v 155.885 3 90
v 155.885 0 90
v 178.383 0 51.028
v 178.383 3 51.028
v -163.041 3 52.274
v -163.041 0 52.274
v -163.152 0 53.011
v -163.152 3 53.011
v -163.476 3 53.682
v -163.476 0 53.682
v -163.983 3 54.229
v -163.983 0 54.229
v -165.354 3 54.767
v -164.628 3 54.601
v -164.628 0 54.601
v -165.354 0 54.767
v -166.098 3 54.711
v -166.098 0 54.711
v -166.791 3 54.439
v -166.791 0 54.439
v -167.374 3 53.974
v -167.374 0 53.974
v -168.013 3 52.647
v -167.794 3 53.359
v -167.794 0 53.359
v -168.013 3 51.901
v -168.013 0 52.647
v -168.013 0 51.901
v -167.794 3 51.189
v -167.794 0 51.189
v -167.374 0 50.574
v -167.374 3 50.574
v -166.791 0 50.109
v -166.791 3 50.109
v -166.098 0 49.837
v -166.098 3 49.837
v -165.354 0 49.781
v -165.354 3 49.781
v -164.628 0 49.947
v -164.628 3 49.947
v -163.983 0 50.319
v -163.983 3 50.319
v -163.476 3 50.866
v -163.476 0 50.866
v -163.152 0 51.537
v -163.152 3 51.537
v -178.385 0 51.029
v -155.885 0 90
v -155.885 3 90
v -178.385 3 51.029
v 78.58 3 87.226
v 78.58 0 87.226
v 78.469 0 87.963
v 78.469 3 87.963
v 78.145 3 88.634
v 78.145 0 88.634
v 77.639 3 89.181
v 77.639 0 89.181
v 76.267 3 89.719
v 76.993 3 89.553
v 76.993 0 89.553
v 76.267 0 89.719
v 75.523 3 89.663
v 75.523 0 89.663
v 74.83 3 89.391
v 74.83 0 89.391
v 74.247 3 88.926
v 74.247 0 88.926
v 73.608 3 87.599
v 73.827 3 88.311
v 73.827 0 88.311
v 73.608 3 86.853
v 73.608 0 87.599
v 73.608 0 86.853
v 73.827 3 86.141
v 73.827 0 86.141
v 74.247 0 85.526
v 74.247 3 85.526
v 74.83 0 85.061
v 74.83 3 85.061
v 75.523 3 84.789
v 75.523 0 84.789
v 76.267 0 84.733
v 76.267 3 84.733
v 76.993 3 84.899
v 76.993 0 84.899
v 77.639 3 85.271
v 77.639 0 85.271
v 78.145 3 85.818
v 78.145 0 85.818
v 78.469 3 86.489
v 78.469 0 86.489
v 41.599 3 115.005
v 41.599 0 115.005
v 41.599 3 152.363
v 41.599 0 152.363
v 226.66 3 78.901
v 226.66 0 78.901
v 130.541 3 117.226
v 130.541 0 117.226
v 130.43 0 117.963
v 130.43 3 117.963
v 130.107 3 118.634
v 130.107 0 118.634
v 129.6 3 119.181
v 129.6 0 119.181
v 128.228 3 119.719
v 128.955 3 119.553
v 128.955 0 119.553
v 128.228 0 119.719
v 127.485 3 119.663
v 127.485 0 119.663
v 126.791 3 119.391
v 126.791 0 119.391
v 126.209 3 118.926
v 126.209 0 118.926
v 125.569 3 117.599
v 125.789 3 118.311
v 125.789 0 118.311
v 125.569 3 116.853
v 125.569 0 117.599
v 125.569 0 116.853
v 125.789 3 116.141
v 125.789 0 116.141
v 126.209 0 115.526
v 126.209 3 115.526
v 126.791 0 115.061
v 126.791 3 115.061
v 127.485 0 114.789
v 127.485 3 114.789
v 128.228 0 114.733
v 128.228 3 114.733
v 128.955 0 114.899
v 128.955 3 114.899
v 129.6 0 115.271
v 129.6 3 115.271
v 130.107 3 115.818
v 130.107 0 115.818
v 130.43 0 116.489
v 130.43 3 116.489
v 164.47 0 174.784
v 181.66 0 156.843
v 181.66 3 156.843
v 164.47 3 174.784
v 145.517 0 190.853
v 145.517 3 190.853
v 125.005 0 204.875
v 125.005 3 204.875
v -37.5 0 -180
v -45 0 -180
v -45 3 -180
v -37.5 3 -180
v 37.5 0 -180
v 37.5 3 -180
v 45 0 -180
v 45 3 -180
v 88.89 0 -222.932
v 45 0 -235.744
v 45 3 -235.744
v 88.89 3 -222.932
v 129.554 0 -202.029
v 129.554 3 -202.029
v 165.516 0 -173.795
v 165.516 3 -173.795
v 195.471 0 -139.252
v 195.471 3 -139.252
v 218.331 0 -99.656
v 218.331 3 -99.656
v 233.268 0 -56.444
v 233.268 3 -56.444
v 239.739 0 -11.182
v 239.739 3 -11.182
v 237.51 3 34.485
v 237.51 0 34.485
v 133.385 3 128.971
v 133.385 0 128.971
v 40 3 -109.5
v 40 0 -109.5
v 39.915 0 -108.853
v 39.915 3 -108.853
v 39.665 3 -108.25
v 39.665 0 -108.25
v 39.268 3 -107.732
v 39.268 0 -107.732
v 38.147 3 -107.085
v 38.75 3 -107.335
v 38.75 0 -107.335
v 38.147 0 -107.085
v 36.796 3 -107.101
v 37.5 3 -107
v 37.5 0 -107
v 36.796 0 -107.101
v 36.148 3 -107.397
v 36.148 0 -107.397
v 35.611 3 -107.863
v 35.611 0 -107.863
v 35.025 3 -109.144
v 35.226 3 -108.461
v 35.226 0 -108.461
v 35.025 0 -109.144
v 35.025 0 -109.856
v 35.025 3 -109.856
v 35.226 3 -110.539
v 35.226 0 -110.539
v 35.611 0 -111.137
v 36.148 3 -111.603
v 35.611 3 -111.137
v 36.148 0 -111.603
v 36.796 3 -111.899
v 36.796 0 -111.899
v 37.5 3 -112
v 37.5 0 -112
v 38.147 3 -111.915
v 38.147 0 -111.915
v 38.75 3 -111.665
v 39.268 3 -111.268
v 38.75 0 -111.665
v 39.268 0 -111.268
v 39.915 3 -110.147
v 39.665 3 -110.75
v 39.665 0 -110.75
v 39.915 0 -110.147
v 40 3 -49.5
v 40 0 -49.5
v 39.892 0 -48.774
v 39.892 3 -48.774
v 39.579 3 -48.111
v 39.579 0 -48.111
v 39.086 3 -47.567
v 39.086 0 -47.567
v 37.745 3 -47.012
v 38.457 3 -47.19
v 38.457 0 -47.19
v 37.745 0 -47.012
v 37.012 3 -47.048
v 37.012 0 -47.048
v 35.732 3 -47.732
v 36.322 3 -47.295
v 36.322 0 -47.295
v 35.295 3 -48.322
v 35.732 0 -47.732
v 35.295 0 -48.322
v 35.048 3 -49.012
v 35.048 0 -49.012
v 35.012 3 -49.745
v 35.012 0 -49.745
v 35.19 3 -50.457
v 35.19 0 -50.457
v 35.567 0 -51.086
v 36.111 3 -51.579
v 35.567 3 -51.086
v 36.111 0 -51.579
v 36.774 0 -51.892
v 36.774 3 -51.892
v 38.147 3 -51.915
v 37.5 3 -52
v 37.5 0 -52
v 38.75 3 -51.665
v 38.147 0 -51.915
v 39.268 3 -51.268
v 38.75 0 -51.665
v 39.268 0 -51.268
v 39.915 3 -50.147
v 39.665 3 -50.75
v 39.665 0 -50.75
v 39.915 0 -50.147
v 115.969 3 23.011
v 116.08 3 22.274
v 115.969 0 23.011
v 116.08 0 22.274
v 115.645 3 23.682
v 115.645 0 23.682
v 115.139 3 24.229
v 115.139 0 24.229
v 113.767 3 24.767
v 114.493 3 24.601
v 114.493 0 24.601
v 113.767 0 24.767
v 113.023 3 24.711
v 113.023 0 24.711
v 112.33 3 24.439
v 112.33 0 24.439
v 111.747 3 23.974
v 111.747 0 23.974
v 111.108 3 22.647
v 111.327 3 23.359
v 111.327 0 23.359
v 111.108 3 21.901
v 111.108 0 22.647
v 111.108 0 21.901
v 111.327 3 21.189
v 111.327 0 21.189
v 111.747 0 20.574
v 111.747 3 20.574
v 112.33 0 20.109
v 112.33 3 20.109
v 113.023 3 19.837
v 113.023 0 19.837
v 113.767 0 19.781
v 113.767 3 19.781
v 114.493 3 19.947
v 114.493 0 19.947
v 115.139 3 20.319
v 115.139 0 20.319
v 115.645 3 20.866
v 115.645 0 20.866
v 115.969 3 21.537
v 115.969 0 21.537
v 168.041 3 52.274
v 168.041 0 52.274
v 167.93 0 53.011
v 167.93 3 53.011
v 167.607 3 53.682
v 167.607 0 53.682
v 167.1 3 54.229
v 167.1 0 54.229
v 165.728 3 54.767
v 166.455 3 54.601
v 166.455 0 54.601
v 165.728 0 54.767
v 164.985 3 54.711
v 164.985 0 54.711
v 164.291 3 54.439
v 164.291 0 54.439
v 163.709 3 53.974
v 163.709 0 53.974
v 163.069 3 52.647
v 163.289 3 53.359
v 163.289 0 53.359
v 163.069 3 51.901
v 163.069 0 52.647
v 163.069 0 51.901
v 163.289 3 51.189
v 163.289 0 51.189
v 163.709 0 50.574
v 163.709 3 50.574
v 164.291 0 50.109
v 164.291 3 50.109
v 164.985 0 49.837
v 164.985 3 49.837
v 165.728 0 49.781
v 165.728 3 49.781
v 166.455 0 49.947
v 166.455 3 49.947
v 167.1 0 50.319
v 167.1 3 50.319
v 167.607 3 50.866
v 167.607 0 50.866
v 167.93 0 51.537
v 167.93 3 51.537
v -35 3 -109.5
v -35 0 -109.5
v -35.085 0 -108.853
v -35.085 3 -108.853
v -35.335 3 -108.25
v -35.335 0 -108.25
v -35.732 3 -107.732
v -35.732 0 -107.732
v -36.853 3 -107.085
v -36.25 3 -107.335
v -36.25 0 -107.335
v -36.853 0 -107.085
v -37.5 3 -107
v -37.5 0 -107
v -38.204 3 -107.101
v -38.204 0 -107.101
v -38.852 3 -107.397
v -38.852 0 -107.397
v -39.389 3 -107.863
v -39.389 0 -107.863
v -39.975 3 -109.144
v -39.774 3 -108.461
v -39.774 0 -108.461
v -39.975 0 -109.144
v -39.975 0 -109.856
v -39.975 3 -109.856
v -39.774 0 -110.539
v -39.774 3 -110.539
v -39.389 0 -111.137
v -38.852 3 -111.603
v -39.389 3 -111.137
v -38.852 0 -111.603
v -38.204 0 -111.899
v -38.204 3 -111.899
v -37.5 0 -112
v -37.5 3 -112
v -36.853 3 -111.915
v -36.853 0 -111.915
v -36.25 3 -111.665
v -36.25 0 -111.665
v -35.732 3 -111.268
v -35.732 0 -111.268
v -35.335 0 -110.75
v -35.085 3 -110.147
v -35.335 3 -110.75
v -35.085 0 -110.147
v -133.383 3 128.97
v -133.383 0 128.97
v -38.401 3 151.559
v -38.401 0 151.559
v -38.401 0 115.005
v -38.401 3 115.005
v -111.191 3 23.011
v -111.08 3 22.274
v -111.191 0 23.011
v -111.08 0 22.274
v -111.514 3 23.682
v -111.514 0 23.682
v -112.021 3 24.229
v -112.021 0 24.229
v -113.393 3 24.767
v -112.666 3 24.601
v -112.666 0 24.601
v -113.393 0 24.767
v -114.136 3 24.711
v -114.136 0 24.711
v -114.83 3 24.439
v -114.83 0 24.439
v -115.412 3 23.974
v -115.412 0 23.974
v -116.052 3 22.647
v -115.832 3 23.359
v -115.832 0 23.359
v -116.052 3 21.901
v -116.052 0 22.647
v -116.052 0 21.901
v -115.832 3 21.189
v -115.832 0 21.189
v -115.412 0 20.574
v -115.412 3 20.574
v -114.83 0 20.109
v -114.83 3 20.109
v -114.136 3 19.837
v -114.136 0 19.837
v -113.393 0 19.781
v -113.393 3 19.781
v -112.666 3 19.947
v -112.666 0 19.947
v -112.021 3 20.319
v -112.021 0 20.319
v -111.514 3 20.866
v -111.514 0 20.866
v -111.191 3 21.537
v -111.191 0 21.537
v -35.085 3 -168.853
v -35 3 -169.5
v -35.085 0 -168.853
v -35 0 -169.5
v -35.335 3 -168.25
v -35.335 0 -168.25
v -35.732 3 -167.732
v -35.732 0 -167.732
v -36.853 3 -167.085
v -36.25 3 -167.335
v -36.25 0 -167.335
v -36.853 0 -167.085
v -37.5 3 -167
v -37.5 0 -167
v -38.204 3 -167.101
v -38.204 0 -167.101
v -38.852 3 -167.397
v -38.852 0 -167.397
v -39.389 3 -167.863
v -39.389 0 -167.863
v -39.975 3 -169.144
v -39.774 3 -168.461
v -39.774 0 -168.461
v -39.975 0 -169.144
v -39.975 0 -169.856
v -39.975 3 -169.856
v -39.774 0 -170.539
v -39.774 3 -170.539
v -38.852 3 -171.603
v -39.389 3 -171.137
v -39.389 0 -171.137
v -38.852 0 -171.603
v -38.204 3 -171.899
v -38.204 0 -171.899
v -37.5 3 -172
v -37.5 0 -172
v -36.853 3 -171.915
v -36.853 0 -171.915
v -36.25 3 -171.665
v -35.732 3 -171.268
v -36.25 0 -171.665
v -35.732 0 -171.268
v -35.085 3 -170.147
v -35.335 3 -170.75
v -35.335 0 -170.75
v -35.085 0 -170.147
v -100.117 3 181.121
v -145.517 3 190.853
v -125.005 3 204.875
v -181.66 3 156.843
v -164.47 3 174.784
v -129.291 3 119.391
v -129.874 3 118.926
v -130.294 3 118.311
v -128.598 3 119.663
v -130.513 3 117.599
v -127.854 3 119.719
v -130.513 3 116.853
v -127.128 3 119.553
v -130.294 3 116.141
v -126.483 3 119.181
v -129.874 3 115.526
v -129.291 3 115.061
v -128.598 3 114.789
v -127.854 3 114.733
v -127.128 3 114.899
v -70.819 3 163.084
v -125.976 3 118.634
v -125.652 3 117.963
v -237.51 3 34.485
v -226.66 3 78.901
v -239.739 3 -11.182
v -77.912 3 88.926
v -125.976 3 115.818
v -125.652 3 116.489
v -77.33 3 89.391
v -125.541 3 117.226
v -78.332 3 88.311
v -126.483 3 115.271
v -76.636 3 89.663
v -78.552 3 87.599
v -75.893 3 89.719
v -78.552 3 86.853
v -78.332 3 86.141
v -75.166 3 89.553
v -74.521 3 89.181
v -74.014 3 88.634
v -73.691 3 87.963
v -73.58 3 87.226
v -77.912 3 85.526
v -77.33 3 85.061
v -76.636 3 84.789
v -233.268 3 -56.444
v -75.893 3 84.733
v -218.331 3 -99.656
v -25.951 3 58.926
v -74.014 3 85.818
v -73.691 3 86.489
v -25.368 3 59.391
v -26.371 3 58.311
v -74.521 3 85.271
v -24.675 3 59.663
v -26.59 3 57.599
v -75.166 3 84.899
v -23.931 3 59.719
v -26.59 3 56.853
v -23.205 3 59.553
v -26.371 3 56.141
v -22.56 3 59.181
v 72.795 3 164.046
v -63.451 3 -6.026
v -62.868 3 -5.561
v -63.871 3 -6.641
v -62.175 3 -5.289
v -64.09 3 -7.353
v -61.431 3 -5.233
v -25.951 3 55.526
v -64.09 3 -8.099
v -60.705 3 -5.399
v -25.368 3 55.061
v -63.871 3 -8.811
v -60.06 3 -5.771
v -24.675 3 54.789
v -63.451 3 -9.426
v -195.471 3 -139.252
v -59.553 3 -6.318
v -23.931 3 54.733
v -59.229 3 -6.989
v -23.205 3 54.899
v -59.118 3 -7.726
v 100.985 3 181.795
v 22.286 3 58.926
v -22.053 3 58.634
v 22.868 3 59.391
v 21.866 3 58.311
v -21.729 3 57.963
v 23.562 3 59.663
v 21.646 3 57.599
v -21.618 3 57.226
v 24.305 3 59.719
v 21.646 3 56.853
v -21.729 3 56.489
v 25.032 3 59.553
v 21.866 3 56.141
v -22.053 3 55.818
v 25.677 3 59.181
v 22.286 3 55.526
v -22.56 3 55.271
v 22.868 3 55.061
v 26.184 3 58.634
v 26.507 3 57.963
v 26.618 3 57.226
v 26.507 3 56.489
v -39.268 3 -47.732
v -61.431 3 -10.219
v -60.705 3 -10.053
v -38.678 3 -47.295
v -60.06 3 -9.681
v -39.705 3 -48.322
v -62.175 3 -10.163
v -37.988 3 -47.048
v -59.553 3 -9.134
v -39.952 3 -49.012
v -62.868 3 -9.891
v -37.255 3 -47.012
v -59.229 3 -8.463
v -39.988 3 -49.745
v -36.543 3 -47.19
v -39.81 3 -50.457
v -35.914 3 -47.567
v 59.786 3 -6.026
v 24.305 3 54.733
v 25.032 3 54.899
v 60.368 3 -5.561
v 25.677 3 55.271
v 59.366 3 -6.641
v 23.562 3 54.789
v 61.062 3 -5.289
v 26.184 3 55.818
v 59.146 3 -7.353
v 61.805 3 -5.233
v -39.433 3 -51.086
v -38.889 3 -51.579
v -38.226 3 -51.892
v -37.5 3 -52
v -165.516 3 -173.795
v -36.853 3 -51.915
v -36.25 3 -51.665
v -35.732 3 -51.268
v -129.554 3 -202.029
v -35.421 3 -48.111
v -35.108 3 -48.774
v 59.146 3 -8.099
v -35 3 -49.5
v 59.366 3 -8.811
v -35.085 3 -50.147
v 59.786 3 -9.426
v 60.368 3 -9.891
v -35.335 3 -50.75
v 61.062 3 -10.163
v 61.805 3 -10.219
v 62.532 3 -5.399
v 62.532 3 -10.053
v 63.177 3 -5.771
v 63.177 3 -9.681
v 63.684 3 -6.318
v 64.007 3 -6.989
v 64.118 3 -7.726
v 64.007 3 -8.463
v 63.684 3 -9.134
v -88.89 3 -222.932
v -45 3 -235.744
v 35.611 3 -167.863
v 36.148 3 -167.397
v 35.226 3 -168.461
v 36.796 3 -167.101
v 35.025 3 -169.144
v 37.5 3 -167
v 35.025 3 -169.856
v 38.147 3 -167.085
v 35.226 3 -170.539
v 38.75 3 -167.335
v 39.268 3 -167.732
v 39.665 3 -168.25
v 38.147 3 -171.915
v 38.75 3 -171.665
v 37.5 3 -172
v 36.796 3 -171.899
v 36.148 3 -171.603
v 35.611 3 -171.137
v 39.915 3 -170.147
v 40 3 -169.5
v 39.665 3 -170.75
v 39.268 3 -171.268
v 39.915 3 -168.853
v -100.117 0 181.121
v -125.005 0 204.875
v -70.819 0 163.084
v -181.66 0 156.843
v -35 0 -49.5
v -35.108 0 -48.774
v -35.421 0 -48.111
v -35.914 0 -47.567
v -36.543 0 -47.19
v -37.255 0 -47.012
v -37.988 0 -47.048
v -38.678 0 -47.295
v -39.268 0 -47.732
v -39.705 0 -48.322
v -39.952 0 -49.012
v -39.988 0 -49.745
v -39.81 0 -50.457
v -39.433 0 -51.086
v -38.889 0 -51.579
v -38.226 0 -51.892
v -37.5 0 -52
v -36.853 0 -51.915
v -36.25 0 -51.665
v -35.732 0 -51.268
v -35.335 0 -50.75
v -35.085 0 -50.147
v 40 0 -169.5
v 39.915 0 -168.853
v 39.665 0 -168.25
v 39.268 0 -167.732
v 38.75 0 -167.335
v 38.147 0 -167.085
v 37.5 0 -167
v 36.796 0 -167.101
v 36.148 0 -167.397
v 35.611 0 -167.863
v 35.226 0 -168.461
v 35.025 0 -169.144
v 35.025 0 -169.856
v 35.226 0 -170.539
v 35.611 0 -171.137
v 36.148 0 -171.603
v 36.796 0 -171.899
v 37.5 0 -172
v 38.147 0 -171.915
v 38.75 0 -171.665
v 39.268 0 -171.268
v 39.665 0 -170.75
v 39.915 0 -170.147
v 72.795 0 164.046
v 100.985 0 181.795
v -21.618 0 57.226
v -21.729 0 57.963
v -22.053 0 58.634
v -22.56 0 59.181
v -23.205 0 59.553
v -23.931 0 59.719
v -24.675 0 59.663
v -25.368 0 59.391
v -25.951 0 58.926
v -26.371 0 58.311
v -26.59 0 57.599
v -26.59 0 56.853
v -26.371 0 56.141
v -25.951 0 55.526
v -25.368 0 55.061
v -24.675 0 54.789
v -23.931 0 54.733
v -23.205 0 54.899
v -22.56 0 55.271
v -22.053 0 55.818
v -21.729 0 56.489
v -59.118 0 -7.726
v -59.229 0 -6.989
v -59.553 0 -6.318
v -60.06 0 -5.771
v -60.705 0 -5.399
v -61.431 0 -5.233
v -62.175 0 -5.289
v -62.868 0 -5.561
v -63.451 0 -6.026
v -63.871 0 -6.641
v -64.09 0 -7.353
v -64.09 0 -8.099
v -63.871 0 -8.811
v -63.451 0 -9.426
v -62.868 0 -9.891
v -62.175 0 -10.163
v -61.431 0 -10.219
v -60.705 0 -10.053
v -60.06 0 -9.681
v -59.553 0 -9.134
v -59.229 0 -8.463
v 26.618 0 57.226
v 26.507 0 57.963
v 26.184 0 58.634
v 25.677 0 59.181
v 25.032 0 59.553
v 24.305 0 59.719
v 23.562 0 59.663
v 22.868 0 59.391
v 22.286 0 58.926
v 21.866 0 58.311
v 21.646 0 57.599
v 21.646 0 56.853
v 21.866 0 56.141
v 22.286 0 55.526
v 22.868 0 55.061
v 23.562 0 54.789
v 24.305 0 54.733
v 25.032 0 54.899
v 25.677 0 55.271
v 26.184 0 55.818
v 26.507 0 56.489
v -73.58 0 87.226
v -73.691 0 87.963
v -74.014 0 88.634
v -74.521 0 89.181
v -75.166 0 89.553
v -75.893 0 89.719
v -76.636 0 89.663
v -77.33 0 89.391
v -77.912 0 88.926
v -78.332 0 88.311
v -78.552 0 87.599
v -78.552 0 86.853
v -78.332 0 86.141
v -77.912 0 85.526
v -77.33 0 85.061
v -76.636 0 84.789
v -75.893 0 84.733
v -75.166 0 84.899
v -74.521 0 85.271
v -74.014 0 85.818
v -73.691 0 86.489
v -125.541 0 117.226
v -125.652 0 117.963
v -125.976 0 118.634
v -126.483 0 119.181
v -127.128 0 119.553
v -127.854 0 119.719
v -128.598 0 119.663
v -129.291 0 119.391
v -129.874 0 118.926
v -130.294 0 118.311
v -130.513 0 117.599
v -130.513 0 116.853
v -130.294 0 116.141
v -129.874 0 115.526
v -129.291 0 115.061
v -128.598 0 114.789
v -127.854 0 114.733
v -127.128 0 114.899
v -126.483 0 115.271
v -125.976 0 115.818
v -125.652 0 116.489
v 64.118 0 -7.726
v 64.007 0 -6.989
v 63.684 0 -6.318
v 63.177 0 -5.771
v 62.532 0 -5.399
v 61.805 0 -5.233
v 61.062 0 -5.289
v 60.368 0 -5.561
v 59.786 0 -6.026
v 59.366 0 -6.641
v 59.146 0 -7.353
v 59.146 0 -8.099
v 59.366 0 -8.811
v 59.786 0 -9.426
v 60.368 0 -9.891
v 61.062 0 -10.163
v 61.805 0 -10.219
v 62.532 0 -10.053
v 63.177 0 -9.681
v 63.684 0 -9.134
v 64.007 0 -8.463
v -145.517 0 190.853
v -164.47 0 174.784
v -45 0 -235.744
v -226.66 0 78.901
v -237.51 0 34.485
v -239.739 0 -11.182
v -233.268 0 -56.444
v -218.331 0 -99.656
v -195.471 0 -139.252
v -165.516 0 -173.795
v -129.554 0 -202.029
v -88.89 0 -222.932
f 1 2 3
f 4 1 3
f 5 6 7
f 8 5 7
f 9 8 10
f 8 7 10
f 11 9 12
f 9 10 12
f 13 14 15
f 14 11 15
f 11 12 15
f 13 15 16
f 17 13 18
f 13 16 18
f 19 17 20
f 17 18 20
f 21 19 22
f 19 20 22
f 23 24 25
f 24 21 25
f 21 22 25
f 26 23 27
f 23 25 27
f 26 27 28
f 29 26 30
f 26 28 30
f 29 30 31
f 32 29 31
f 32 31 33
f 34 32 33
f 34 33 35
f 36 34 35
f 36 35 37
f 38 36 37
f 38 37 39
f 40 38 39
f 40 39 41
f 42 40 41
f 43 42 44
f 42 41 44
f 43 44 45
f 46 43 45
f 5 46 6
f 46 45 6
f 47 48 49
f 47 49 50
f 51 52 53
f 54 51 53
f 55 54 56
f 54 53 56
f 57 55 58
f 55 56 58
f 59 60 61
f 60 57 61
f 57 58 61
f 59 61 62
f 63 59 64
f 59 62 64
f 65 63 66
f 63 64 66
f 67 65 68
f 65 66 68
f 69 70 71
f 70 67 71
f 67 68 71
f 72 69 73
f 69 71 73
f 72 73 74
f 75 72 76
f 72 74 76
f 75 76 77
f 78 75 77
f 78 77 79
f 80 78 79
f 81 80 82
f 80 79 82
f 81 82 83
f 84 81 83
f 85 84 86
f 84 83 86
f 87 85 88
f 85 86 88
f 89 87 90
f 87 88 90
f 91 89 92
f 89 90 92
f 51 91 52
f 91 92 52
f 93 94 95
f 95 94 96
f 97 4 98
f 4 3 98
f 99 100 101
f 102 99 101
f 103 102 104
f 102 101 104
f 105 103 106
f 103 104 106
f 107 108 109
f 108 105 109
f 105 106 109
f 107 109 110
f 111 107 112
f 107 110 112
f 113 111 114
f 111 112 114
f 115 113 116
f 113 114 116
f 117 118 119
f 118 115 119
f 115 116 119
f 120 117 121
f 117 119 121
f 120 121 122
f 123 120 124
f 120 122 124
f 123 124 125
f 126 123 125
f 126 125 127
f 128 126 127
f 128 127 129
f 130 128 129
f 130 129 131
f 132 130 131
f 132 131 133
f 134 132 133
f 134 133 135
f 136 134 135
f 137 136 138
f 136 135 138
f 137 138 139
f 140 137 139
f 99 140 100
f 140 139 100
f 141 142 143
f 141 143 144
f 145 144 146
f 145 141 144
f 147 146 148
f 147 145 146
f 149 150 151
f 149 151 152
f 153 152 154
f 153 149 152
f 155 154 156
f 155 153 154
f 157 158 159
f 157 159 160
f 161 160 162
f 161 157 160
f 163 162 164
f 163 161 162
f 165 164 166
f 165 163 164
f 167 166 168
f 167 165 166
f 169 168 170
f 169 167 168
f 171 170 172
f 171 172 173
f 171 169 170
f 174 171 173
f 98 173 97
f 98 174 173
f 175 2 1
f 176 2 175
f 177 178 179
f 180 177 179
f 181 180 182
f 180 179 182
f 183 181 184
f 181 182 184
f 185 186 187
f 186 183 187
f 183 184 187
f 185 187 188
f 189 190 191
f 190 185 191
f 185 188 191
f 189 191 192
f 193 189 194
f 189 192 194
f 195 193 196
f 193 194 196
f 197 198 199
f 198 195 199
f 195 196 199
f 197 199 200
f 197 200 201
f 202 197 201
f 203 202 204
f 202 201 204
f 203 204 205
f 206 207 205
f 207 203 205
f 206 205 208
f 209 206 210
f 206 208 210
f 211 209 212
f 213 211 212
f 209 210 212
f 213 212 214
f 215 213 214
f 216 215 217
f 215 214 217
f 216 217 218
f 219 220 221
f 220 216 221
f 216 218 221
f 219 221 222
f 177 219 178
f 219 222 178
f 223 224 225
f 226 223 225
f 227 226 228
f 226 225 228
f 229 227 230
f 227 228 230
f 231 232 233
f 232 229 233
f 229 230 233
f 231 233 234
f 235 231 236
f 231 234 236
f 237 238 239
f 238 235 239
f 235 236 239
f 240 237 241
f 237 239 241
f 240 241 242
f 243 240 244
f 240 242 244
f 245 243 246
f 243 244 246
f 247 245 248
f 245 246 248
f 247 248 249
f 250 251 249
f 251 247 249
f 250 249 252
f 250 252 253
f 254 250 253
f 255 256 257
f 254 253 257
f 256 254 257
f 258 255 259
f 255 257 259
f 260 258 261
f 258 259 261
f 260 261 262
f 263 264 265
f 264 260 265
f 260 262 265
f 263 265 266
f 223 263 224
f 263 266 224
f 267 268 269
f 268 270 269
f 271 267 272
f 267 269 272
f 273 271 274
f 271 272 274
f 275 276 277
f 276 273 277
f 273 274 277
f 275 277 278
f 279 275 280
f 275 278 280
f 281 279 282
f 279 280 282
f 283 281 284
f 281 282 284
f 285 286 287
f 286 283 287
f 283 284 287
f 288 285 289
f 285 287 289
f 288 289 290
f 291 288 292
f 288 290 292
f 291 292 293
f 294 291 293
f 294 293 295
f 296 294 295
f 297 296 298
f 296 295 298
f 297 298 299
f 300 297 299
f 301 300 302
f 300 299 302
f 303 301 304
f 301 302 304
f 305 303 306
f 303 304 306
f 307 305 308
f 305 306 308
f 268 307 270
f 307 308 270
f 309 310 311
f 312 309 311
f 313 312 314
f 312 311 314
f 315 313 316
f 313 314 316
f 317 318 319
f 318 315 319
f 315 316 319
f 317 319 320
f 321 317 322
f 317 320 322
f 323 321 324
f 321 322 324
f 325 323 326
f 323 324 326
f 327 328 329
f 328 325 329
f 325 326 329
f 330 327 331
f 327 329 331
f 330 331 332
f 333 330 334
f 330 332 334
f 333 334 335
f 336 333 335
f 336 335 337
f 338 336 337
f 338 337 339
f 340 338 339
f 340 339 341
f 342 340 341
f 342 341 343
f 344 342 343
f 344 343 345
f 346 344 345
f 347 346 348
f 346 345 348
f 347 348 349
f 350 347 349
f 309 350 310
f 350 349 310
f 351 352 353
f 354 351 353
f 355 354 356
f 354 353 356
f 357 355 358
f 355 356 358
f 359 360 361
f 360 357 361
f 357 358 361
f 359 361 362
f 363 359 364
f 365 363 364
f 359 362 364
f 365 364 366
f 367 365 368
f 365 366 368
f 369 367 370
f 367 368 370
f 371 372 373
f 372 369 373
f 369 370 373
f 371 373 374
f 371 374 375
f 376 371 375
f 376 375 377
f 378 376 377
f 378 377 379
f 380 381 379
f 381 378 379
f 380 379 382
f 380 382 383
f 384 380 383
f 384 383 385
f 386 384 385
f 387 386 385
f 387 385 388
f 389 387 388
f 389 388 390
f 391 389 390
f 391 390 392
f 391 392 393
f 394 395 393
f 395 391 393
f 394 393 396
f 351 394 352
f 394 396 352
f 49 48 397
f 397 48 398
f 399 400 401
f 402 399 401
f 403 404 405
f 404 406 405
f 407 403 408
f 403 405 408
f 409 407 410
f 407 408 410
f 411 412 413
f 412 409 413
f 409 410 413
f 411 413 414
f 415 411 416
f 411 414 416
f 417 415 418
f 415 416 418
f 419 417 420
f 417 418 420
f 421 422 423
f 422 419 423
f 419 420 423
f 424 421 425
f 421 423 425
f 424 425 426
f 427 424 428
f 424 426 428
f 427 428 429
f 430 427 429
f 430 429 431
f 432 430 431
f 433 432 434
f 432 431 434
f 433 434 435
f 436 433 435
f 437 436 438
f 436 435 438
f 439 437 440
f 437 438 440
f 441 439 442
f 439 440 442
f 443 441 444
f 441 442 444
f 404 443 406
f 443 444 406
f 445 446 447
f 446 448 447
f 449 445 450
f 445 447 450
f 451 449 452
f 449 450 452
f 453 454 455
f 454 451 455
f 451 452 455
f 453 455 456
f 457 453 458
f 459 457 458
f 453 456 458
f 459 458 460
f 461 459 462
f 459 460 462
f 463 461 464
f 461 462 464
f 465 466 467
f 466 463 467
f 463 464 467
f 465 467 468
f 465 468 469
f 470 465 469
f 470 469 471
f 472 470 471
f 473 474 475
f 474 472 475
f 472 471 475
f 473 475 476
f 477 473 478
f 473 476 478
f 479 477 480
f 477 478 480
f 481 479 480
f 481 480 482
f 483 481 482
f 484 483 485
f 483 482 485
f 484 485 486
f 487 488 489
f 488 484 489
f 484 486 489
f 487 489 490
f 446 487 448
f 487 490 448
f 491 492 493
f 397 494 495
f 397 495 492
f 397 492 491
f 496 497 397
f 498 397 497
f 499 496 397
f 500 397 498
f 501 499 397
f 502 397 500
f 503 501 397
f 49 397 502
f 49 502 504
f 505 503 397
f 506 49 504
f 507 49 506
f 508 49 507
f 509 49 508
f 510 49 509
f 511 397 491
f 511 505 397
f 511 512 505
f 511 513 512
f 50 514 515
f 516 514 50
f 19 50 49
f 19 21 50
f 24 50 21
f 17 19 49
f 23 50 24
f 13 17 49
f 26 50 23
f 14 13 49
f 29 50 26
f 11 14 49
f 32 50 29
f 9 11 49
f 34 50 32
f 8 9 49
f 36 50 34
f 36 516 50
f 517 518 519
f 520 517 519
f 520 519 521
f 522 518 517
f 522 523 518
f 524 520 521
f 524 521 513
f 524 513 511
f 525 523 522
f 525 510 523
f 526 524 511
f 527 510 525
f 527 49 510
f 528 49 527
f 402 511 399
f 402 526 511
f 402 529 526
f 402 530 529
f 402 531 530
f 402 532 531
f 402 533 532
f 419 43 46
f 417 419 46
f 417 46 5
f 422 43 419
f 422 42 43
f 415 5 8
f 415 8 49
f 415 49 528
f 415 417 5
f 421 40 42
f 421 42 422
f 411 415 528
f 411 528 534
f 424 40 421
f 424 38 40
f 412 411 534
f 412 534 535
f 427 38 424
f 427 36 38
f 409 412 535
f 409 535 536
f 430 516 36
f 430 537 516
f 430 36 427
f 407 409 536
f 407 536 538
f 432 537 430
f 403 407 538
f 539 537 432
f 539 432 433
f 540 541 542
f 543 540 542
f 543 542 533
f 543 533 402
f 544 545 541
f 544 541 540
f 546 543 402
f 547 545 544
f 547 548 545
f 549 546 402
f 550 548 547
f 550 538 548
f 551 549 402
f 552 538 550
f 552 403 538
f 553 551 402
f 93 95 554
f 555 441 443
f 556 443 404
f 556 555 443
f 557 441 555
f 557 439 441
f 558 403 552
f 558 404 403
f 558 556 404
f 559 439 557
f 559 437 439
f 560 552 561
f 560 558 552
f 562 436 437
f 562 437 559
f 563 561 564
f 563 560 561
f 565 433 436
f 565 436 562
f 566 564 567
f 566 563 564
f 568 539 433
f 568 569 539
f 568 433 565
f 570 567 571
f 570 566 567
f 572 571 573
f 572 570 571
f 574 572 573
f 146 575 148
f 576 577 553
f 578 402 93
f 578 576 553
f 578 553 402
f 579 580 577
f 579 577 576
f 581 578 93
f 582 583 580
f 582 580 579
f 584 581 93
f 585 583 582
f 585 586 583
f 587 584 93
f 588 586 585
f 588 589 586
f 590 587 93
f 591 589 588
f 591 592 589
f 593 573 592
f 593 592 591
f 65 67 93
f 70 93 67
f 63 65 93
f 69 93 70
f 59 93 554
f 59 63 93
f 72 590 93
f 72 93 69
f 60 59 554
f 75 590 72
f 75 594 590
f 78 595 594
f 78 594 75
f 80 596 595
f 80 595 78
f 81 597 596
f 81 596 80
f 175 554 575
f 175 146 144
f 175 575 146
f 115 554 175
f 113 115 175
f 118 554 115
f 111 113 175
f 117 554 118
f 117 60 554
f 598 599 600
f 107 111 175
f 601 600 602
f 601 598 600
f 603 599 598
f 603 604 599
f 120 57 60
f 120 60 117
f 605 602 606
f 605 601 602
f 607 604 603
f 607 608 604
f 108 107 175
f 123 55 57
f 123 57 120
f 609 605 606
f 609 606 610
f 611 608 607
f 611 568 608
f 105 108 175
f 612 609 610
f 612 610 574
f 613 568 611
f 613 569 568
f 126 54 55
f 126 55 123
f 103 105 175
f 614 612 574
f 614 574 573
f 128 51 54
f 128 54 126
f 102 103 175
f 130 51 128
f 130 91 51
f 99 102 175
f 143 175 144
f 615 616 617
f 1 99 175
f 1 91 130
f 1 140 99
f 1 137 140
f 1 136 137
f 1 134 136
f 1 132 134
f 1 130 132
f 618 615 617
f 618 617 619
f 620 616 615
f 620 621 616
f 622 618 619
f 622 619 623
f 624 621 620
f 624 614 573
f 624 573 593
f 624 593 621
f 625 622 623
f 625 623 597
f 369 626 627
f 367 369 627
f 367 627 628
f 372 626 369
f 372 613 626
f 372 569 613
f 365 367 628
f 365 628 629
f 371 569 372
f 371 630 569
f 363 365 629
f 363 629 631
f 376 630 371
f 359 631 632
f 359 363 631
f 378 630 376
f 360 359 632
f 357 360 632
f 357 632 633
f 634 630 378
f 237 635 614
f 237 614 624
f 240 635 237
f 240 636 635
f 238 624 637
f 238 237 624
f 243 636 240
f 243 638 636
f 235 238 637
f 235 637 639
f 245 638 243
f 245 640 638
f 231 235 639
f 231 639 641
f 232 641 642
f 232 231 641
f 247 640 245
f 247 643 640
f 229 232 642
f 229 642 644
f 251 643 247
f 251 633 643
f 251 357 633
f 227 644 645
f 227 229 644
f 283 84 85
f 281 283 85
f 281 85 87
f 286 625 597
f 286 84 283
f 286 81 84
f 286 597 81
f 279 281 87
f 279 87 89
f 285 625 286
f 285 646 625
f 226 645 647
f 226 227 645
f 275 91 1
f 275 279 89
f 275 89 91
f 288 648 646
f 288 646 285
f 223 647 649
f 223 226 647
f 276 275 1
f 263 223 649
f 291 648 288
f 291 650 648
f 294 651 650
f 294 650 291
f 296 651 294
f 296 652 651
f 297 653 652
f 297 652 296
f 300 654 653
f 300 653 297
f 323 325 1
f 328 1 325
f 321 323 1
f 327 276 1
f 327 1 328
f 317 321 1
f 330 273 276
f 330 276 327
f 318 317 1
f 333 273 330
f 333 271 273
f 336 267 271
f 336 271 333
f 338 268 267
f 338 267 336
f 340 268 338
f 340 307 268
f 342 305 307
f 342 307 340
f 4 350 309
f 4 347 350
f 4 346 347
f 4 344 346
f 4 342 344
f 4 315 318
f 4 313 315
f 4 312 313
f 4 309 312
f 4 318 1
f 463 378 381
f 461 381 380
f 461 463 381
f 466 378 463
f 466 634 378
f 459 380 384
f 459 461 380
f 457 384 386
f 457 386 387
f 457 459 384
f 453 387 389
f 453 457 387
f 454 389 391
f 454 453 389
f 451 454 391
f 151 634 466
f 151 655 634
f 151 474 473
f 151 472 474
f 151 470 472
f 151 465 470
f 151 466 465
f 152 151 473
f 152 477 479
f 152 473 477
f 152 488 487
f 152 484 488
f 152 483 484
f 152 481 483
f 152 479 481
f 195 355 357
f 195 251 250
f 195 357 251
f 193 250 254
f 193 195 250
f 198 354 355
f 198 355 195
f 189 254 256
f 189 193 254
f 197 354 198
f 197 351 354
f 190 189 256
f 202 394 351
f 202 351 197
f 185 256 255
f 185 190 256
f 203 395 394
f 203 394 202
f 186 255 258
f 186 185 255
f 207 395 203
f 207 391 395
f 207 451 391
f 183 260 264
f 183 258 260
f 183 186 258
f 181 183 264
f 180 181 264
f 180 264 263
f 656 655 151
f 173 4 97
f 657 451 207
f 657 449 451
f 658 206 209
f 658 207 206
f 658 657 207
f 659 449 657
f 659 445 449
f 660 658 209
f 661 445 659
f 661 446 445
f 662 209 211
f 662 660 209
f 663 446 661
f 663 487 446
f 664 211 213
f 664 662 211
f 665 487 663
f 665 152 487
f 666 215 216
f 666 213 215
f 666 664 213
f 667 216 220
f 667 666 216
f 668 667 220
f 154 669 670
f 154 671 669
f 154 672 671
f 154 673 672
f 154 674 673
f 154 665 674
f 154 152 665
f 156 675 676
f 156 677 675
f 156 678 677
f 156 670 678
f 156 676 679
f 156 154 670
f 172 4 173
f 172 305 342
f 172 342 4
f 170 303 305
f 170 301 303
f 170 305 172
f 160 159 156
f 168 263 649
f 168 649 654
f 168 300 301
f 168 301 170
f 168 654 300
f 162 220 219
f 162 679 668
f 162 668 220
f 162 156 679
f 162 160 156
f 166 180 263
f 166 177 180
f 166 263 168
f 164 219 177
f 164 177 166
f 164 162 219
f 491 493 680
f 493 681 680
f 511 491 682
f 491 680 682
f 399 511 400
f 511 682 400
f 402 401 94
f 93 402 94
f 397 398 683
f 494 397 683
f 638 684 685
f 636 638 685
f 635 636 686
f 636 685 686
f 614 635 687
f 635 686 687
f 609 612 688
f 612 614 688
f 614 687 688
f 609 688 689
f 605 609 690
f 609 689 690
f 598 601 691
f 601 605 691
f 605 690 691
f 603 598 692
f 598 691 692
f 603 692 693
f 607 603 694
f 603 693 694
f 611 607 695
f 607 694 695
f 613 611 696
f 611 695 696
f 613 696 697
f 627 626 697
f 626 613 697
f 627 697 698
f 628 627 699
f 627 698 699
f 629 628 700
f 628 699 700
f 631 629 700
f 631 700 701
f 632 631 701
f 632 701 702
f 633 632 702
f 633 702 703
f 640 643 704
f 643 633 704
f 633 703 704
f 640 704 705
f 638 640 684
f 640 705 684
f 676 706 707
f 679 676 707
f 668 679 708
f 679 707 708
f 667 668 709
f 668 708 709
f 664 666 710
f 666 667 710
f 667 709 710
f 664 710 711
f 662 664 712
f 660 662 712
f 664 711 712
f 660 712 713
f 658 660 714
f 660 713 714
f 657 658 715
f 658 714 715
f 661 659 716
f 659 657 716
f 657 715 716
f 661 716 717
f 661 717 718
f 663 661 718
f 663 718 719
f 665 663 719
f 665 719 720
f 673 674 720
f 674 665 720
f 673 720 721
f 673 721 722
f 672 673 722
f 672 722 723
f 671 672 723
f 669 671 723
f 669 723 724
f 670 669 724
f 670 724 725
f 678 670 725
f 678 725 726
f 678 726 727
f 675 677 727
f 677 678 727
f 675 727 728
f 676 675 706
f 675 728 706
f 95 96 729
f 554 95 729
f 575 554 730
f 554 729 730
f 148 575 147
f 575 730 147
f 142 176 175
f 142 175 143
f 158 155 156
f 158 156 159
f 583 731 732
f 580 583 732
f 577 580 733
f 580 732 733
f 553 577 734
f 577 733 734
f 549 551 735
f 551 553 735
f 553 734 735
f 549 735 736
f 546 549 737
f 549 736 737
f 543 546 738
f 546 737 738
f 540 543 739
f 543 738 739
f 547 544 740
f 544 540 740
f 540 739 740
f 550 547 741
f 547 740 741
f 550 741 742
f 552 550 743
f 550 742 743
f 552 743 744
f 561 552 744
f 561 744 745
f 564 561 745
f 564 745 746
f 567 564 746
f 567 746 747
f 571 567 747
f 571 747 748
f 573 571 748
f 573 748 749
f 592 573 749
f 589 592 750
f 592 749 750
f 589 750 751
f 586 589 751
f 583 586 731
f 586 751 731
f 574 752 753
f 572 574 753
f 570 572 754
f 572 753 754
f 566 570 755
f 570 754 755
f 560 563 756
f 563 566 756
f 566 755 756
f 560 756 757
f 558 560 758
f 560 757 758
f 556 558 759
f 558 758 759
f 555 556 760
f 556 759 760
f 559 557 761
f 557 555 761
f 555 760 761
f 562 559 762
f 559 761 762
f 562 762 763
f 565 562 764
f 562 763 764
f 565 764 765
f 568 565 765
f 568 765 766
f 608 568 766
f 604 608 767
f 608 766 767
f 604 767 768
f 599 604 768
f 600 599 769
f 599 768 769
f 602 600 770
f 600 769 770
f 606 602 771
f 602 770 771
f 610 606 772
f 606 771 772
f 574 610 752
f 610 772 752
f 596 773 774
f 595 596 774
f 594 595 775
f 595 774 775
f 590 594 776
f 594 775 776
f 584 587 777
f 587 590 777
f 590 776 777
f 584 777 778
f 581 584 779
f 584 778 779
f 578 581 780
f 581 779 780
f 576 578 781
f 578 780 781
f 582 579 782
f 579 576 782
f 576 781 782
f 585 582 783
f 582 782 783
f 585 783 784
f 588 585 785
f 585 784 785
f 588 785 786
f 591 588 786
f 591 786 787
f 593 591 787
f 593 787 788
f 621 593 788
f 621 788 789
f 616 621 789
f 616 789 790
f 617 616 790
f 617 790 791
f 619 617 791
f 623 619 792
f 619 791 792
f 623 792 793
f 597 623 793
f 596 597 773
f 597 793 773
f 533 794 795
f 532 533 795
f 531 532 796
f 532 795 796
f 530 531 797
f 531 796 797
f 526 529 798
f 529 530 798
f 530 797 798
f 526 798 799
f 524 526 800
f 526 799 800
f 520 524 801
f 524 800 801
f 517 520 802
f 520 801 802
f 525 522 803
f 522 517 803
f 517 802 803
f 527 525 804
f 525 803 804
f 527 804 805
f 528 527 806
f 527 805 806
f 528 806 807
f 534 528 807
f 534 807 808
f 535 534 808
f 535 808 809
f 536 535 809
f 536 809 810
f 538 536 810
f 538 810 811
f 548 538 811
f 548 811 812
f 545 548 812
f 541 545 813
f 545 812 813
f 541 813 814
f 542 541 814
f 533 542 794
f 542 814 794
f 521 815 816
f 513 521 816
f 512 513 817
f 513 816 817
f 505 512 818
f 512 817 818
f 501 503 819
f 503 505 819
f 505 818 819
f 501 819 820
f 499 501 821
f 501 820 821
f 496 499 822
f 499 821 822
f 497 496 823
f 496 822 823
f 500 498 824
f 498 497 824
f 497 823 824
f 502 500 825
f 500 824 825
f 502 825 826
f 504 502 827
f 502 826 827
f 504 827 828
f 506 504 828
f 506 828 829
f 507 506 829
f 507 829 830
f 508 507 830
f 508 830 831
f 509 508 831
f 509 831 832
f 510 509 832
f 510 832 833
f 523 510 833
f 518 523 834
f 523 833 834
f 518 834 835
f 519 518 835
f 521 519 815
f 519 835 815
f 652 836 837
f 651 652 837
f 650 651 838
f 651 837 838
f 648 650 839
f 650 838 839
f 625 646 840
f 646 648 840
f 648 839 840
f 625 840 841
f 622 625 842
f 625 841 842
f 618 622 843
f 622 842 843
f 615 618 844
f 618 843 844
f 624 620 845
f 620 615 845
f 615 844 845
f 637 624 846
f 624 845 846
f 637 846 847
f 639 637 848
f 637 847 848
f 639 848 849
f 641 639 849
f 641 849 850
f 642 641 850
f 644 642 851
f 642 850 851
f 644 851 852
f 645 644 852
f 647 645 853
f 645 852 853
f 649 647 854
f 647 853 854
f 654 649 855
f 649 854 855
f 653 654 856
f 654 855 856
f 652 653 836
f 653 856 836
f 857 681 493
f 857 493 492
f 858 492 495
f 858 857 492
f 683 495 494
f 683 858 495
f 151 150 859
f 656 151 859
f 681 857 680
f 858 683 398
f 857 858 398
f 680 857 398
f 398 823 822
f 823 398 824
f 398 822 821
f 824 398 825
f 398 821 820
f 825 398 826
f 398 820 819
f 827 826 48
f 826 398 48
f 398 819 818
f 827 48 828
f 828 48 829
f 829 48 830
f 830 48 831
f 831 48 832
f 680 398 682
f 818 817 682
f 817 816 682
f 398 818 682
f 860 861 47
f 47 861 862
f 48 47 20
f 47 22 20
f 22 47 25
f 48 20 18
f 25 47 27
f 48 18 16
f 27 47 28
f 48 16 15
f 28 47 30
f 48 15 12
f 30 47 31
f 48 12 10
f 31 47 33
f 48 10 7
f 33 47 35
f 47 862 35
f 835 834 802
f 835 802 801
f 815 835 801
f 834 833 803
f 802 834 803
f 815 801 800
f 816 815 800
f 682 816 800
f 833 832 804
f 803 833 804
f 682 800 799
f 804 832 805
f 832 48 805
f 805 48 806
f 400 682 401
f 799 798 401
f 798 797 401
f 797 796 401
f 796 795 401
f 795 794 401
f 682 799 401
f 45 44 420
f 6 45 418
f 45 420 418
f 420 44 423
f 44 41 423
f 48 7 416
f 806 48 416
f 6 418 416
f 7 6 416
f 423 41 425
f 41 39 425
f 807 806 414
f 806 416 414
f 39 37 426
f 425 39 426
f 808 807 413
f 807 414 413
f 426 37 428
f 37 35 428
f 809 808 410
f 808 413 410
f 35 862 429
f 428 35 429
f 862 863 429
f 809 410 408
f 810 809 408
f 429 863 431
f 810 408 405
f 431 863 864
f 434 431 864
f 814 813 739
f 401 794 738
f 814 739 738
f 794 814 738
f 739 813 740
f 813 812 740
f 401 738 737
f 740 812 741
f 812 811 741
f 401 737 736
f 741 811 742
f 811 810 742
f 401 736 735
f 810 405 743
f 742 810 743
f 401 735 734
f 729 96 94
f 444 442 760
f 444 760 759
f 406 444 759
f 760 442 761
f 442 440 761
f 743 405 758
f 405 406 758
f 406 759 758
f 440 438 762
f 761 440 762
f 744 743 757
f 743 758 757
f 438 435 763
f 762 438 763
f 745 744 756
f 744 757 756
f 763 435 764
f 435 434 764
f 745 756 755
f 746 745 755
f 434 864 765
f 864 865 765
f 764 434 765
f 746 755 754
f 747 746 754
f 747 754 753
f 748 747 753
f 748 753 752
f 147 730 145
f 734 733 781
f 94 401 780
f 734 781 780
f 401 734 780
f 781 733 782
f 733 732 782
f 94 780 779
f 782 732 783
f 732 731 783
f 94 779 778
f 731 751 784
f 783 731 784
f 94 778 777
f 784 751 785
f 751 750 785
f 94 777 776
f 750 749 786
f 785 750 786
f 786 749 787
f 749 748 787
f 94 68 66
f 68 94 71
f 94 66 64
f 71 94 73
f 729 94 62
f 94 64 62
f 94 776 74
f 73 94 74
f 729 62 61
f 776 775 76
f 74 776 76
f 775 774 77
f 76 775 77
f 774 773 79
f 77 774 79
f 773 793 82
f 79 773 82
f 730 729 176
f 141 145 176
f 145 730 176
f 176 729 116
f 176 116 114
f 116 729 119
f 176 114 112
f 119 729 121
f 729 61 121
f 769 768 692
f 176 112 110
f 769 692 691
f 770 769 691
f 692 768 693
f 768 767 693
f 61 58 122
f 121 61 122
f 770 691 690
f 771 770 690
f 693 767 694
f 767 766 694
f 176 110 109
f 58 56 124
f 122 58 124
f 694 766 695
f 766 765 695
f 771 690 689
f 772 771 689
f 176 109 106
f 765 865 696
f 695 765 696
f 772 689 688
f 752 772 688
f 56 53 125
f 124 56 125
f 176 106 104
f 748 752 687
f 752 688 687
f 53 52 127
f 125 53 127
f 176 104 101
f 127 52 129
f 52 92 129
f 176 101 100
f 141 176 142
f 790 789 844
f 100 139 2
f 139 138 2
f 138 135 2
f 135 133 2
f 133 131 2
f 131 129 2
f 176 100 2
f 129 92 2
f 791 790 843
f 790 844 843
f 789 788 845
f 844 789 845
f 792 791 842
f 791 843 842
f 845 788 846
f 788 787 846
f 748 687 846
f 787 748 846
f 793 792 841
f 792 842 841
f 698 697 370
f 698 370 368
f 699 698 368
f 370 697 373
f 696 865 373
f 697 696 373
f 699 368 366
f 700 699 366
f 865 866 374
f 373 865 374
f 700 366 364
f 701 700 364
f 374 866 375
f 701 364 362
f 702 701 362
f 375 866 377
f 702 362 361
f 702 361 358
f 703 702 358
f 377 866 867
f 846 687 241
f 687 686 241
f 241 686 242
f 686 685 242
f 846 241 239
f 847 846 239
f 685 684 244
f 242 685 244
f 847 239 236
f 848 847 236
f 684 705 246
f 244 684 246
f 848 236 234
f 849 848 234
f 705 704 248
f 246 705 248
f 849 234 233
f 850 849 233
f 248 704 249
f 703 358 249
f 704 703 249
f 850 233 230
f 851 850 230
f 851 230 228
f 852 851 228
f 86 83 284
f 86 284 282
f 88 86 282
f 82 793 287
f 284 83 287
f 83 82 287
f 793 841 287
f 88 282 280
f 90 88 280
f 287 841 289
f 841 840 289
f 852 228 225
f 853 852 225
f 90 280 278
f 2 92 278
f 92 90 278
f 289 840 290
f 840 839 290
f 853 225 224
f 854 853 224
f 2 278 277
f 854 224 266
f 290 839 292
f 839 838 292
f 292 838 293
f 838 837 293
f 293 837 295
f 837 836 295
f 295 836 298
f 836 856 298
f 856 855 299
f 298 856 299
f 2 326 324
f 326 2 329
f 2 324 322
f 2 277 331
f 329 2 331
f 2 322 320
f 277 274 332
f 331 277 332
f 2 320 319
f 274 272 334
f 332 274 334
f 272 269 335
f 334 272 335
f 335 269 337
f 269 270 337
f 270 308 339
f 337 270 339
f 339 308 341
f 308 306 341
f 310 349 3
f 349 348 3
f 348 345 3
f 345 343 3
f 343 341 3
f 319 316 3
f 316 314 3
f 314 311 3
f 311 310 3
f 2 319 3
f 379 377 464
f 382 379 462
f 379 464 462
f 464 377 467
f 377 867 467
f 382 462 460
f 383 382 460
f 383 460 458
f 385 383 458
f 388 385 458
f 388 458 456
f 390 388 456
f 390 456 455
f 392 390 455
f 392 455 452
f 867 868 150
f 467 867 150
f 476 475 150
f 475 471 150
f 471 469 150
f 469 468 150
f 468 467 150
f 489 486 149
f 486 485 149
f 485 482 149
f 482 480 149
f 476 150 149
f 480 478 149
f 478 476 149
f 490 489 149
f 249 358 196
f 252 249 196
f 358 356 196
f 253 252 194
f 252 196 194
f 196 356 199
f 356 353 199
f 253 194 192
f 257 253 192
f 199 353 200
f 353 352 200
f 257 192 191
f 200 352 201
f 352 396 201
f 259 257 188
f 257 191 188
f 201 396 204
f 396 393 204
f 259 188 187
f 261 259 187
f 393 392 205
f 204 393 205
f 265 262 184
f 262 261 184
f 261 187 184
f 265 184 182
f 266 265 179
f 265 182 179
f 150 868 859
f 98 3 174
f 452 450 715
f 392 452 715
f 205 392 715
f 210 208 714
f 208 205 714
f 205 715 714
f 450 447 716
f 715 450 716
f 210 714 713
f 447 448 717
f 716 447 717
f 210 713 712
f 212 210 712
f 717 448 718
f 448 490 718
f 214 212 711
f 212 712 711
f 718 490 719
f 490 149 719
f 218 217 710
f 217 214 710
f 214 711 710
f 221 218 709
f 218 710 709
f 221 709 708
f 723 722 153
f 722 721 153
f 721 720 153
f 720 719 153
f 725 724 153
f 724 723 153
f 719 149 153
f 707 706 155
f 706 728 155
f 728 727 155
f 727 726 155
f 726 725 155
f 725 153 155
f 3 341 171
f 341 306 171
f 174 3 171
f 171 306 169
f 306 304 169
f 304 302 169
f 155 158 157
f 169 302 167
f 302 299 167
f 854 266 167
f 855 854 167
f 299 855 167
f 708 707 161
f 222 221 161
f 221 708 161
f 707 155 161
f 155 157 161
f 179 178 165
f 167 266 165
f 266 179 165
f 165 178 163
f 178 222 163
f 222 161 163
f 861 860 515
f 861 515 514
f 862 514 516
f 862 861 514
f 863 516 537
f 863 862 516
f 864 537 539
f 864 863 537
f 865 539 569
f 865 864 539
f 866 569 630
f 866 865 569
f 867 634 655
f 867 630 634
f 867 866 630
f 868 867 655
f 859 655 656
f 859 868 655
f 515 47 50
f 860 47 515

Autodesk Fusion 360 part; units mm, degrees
sketch "Sketch1" plane through (0, 0, 0) normal (0, 1, 0) x (1, 0, 0)
  circle A0 centre (0, 0) radius 240
  line L0 (0, 0) -> (-207.8461, -120)
  line L1 (0, 0) -> (240, 0) construction
  line L2 (0, 0) -> (207.8461, -120)
  line L3 (0, 0) -> (240, 0) construction
  line L4 (0, 0) -> (0, 240)
  line L5 (0, 240) -> (0, 180)
  line L6 (0, 180) -> (-45, 180)
  line L7 (0, 180) -> (45, 180)
  line L8 (45, 180) -> (45, 235.7435)
  line L9 (-45, 180) -> (-45, 179.9979)
  line L10 (-45, 179.9979) -> (-45, 235.7435)
  line L11 (-133.3828, -128.9701) -> (-181.6599, -156.8429)
  line L12 (-155.8846, -90) -> (-133.3846, -128.9711)
  line L13 (-155.8846, -90) -> (-178.3846, -51.0289)
  line L14 (-178.3846, -51.0289) -> (-226.6599, -78.9006)
  line L15 (178.3828, -51.0278) -> (226.6599, -78.9006)
  line L16 (155.8846, -90) -> (178.3846, -51.0289)
  line L17 (155.8846, -90) -> (133.3846, -128.9711)
  line L18 (133.3846, -128.9711) -> (181.6599, -156.8429)
  line L19 (0, 180) -> (-37.5, 180)
  line L20 (-37.5, 180) -> (-37.5, 169.5)
  circle A1 centre (-37.5, 169.5) radius 2.5
  line L21 (-37.5, 169.5) -> (-37.5, 109.5)
  line L22 (-37.5, 109.5) -> (-37.5, 49.5)
  circle A2 centre (-37.5, 109.5) radius 2.5
  circle A3 centre (-37.5, 49.5) radius 2.5
  line L23 (37.5, 109.5) -> (37.5, 49.5)
  circle A4 centre (37.5, 49.5) radius 2.5
  circle A5 centre (37.5, 109.5) radius 2.5
  line L24 (37.5, 169.5) -> (37.5, 109.5)
  circle A6 centre (37.5, 169.5) radius 2.5
  line L25 (37.5, 180) -> (37.5, 169.5)
  circle A7 centre (-165.5413, -52.274) radius 2.5
  circle A8 centre (-113.5798, -22.274) radius 2.5
  circle A9 centre (-61.6183, 7.726) radius 2.5
  circle A10 centre (-24.1183, -57.226) radius 2.5
  circle A11 centre (-76.0798, -87.226) radius 2.5
  circle A12 centre (-128.0413, -117.226) radius 2.5
  circle A13 centre (128.0413, -117.226) radius 2.5
  circle A14 centre (76.0798, -87.226) radius 2.5
  circle A15 centre (24.1183, -57.226) radius 2.5
  circle A16 centre (61.6183, 7.726) radius 2.5
  circle A17 centre (113.5798, -22.274) radius 2.5
  circle A18 centre (165.5413, -52.274) radius 2.5
  arc A19 (125.0048, -204.8751) -> (-125.0048, -204.8751) centre (0, -310.93) ccw
  line L26 (-38.4014, -152.3633) -> (-38.4014, -115.0053)
  line L27 (-38.4014, -115.0053) -> (41.5986, -115.0053)
  line L28 (41.5986, -115.0053) -> (41.5986, -152.3633)
  dimension "d90" = 480
  dimension "d91" = 150
  dimension "d92" = 30
  dimension "d100" = 60
  dimension "d101" = 45
  dimension "d102" = 45
  dimension "d104" = 360
  dimension "d105" = 37.5
  dimension "d106" = 10.5
  dimension "d107" = 5
  dimension "d108" = 60
  dimension "d109" = 60
  dimension "d110" = 5
  dimension "d111" = 5
  dimension "d113" = 360
extrude "Extrude2" add sketch "Sketch1" along normal blind 3 contours A0 L2 L4 L7 L8 L15 L16 | A0 L0 L4 L6 L10 L13 L14 L19 | A0 L0 L2 L11 L12 L17 L18 A19 L26 L27 L28
equation "d92 = 150 deg - 120 deg"
equation "d101 = ( 90 / 2 ) * 1 mm"
equation "d102 = ( 90 / 2 ) * 1 mm"
equation "d61 = ( 42 / 2 ) * 1 mm"
